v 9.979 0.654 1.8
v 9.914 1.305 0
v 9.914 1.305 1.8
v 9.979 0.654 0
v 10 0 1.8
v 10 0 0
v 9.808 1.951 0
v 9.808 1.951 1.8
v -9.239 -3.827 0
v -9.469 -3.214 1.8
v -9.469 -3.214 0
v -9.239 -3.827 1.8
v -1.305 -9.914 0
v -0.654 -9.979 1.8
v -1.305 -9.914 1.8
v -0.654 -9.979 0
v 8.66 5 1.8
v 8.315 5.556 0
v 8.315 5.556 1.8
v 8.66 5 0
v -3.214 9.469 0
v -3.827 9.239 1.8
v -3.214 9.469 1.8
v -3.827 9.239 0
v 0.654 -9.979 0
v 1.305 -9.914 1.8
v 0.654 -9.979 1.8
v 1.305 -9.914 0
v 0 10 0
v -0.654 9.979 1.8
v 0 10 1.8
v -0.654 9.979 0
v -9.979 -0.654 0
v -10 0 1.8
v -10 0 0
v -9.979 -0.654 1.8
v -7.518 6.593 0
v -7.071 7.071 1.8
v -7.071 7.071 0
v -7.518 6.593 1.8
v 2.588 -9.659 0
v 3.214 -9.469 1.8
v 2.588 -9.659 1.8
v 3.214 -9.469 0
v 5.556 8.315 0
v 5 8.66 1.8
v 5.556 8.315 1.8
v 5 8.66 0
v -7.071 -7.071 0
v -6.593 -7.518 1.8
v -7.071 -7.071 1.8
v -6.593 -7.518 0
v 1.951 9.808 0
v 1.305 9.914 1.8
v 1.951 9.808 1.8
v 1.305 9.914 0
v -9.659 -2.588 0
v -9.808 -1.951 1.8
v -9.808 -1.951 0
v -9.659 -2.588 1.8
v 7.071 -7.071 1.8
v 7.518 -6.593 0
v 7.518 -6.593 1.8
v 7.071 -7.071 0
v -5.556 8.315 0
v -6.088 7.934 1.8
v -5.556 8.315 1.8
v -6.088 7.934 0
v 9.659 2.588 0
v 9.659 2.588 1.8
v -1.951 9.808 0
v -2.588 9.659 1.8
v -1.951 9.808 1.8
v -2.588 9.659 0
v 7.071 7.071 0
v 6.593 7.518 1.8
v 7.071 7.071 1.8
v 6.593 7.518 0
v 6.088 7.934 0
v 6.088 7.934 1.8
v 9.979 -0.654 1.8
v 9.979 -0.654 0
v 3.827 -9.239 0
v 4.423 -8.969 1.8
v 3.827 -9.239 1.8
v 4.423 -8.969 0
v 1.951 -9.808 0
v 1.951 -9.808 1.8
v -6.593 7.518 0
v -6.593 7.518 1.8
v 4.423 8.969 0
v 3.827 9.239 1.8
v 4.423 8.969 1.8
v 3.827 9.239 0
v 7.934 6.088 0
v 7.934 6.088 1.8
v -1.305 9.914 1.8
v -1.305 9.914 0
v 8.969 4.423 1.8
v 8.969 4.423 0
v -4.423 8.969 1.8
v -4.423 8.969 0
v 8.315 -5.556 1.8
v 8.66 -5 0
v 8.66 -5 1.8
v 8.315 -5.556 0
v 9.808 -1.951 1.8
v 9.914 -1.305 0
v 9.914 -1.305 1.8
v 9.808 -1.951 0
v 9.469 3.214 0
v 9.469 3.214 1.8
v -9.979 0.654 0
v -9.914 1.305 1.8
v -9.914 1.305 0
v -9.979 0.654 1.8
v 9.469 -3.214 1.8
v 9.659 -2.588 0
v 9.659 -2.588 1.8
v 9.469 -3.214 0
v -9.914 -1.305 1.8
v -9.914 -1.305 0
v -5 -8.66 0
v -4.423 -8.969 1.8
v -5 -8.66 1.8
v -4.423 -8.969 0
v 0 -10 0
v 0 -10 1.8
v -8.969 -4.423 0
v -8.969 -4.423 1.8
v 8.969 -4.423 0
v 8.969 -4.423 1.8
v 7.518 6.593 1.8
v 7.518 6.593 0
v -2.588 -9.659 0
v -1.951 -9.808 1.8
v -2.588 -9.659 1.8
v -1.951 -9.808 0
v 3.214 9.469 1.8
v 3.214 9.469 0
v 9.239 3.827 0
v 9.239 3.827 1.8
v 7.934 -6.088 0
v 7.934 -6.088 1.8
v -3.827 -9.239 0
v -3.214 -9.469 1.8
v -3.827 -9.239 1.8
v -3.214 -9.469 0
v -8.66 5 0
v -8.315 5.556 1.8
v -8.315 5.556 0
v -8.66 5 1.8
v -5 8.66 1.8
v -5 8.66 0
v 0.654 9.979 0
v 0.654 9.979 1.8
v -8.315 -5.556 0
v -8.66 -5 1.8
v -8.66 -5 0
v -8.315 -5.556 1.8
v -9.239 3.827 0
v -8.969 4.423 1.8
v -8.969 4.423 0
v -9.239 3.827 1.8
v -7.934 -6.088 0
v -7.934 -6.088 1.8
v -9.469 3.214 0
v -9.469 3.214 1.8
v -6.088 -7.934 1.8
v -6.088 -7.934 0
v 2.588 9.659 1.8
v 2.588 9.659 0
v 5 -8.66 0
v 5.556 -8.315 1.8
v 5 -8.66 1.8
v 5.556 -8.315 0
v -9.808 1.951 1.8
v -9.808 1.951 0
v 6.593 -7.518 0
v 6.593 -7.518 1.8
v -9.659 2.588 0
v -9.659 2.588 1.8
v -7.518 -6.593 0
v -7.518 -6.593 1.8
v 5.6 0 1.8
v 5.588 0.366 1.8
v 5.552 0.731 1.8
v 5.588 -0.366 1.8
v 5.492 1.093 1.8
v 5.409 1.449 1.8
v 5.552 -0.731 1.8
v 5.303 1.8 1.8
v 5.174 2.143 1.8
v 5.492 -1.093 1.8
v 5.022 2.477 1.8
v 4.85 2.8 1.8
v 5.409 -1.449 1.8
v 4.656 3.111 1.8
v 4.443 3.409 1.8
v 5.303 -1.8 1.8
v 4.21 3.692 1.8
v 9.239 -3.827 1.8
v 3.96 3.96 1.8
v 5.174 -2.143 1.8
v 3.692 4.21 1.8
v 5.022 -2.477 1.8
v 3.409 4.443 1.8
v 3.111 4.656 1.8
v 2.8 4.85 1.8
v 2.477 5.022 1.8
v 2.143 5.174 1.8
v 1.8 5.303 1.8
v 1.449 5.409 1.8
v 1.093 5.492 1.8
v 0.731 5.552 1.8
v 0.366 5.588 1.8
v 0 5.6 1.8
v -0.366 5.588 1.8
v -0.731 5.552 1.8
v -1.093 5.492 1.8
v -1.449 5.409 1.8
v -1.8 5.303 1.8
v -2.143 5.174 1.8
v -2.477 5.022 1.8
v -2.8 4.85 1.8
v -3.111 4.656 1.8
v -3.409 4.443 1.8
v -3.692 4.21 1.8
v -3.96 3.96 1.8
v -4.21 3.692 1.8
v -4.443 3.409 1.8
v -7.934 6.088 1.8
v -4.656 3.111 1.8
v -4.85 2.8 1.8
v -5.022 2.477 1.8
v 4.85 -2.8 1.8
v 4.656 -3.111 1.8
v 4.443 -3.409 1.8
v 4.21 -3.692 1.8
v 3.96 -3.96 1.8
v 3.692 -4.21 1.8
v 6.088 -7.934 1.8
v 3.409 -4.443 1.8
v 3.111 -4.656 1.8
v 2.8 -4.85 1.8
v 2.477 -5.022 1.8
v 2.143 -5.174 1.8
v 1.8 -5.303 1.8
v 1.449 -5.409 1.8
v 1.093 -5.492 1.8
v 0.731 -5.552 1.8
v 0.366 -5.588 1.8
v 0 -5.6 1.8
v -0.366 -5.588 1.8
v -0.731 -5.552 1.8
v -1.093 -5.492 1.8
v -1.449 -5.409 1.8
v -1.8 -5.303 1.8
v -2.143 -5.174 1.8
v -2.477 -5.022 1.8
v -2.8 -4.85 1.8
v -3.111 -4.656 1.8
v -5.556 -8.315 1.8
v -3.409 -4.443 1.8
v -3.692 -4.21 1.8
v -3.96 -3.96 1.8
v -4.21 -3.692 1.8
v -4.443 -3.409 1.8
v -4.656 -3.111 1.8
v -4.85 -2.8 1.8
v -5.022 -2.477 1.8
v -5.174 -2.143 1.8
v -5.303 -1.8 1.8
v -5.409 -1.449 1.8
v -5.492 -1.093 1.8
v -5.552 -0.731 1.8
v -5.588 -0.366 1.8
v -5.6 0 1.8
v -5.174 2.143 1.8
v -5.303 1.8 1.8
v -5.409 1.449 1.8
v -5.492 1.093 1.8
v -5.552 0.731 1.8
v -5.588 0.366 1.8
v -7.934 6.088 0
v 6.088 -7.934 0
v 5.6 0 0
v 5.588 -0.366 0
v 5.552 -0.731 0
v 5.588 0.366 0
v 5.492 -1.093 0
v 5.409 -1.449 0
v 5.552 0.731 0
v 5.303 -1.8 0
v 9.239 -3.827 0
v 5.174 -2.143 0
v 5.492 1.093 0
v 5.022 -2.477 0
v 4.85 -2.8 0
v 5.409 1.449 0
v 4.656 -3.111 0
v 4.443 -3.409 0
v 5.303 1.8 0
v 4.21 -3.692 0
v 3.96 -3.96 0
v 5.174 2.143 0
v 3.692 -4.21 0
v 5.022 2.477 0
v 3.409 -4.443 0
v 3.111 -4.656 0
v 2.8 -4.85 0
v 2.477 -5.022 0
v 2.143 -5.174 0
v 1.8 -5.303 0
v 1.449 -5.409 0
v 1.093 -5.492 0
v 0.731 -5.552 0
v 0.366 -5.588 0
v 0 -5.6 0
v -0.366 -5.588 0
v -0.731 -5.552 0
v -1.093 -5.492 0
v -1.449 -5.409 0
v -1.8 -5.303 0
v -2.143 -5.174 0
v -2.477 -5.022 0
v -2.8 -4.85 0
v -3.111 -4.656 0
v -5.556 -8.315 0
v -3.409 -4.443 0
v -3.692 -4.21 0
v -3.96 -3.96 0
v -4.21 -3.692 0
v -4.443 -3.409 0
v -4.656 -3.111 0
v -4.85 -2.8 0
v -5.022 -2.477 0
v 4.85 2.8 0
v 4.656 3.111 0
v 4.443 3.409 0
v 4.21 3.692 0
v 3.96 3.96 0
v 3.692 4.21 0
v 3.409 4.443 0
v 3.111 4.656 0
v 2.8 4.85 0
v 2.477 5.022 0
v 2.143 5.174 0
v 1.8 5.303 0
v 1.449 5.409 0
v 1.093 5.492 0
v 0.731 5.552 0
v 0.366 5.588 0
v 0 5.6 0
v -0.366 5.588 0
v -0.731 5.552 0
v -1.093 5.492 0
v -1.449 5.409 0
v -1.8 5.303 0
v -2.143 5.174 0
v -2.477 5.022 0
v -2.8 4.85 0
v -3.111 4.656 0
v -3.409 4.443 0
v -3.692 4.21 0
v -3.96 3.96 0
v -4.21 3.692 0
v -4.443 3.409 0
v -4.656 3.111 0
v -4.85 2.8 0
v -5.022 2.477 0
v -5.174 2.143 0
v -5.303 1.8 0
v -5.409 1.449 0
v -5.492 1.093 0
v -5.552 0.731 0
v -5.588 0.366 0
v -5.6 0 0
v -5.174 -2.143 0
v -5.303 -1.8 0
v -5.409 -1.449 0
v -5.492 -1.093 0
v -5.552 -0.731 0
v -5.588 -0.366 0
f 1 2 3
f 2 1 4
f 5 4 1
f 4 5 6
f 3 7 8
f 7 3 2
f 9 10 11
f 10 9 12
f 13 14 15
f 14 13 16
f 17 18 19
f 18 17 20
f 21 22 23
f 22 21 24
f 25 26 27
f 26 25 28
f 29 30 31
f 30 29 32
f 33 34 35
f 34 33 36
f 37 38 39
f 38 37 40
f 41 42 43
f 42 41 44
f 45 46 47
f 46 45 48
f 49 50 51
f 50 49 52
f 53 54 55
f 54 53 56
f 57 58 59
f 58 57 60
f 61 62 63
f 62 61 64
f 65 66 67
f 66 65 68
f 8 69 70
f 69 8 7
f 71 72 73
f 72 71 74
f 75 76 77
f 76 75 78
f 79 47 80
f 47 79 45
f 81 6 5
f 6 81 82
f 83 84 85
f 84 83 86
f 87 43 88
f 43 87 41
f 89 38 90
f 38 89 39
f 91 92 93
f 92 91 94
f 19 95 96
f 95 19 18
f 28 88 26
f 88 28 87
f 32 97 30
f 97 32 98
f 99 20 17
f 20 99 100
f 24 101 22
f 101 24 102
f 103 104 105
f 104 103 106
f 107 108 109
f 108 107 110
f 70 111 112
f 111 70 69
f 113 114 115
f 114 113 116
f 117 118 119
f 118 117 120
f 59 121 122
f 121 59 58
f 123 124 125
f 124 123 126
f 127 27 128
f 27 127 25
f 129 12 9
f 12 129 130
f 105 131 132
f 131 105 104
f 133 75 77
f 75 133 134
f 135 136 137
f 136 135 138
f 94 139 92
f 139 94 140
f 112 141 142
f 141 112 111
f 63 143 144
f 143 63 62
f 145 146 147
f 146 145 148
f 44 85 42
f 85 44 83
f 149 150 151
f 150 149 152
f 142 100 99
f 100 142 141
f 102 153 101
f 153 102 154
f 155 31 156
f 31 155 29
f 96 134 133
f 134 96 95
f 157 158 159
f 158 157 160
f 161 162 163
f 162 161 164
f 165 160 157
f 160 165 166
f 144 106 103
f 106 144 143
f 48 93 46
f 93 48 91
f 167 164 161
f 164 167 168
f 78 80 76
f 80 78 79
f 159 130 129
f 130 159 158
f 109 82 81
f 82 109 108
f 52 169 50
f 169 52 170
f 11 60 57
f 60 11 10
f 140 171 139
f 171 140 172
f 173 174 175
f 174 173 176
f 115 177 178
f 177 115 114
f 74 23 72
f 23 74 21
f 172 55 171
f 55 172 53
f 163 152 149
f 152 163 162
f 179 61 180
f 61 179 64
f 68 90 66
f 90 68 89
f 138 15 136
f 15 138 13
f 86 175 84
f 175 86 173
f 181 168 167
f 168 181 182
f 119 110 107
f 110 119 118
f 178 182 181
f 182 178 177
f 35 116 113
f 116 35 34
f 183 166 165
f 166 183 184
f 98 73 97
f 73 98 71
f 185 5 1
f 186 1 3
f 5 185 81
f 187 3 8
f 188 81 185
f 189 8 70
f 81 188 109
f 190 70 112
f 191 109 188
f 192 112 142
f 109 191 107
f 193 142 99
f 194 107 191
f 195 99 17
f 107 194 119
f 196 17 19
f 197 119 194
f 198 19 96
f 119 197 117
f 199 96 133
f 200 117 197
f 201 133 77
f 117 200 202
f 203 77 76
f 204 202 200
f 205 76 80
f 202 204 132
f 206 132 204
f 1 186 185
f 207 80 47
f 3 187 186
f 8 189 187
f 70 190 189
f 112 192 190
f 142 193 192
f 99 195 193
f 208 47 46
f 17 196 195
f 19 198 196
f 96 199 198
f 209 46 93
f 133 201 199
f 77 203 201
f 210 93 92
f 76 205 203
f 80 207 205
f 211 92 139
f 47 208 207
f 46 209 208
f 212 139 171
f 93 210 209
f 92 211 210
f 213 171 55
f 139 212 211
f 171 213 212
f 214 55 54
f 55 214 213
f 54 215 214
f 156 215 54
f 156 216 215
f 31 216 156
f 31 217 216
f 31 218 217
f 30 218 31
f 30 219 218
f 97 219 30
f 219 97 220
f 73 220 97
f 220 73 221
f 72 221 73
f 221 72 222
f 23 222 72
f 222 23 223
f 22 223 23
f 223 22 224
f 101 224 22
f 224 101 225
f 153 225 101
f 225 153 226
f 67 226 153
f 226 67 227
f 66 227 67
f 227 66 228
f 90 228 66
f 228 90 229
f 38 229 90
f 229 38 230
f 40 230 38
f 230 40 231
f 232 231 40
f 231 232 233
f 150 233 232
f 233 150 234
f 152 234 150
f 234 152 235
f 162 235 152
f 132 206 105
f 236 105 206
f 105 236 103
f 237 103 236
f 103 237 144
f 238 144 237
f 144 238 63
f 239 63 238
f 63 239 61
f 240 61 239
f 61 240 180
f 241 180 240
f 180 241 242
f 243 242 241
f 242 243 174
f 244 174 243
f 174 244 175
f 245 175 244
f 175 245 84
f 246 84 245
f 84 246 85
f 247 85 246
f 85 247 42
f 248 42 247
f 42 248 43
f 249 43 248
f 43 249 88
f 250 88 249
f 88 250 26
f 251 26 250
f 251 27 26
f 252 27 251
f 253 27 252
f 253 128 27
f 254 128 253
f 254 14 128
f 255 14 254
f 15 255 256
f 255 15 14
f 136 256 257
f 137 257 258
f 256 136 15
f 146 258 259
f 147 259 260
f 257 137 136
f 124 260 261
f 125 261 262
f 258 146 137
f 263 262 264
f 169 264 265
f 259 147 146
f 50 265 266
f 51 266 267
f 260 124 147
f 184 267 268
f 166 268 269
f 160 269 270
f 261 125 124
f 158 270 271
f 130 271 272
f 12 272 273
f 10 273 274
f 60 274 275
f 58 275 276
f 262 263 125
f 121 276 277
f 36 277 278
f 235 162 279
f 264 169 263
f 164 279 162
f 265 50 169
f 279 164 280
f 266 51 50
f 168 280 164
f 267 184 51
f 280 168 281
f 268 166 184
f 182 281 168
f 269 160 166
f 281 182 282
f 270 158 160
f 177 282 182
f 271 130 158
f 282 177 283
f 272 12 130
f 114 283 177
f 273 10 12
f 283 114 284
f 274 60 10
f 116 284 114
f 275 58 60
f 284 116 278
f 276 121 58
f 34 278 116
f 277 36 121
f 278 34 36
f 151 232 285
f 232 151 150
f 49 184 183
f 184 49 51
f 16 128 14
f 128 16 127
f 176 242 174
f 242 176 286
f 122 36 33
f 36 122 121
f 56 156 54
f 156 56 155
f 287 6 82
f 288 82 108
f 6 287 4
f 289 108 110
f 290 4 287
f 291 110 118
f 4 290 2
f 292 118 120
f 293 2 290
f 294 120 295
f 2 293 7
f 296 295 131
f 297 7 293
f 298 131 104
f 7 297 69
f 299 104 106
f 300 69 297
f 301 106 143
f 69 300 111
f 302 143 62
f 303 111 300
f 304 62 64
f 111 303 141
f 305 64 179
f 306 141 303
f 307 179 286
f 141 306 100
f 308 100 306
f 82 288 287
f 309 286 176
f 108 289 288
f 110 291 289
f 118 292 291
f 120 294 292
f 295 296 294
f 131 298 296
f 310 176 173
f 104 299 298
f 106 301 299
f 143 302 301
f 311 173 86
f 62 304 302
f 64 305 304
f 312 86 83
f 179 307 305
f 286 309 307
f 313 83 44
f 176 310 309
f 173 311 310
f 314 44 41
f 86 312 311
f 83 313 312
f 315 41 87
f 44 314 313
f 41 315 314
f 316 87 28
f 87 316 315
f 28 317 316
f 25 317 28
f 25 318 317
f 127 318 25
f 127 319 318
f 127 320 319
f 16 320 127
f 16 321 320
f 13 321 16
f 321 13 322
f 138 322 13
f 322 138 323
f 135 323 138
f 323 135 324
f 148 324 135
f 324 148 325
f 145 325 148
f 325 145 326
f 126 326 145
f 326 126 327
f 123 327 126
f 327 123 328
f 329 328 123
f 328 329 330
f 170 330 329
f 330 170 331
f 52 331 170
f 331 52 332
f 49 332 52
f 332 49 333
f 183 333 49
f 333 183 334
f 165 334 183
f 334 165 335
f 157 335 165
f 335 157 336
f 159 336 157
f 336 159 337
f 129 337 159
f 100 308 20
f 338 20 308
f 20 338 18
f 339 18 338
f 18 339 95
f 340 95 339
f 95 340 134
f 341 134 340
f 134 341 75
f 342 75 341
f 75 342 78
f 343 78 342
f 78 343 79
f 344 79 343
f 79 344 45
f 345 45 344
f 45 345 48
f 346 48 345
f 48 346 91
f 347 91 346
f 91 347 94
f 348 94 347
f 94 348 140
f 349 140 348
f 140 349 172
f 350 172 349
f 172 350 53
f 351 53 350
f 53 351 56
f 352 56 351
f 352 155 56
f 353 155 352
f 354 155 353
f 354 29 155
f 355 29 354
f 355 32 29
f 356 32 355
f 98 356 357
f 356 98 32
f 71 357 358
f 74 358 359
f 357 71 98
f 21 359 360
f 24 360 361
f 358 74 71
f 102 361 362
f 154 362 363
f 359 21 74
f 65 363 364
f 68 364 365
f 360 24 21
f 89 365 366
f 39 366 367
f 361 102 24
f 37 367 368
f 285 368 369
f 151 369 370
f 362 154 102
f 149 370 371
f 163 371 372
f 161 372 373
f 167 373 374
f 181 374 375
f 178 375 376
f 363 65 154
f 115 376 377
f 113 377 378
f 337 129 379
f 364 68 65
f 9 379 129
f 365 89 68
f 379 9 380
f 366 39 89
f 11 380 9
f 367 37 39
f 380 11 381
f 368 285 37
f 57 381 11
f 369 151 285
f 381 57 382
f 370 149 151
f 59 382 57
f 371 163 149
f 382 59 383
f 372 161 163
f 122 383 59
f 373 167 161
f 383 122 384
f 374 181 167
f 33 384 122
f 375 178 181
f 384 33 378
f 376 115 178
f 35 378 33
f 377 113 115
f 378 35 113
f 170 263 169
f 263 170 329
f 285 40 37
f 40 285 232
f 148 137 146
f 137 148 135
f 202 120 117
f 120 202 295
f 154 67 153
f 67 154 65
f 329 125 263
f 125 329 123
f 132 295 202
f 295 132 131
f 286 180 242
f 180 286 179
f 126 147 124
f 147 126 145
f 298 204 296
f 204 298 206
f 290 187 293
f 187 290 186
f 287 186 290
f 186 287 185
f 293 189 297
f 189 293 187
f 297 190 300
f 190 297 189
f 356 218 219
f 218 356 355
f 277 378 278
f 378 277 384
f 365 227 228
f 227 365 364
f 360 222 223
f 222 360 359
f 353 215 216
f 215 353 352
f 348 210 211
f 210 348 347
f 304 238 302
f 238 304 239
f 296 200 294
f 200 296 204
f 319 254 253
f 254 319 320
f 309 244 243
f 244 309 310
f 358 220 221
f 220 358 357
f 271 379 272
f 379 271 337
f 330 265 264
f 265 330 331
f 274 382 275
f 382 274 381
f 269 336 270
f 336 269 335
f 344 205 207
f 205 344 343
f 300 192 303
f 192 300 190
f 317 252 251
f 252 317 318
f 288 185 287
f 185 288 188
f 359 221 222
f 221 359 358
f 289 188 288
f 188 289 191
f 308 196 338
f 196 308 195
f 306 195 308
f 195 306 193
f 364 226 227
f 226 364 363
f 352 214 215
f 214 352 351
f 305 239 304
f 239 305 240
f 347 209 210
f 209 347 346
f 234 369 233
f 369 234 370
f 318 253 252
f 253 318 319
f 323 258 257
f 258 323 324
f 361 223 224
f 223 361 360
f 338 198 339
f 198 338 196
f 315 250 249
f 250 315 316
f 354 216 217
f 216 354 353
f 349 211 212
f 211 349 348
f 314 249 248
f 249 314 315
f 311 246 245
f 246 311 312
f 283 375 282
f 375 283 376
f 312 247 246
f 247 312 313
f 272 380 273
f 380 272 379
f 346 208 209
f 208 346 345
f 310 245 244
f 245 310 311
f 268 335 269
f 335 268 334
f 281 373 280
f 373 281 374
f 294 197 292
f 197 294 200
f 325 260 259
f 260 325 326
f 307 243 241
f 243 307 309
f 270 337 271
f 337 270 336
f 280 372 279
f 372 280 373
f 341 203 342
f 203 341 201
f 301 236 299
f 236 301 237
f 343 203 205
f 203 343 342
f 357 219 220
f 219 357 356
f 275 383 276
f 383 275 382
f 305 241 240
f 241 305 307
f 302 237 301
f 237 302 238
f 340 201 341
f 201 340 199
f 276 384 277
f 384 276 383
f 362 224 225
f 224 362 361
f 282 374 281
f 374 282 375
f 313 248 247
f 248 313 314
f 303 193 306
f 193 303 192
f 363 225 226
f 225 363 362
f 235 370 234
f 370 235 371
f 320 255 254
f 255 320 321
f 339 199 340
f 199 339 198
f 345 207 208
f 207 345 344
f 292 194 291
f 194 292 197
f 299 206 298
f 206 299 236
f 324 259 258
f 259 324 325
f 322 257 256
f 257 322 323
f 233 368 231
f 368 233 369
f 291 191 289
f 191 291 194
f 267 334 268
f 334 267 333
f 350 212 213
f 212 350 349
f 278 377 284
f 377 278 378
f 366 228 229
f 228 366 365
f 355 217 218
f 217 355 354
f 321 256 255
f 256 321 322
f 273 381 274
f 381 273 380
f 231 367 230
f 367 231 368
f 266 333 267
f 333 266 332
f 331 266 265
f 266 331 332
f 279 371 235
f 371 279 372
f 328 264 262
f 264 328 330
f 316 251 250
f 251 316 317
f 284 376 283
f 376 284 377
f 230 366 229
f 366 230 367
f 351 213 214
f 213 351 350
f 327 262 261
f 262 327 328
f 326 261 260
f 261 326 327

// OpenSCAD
// Decorative lens flange: 20 mm ring around the camera lens, 11.2 mm hole (clears the lugs on the lens), 1.8 mm thick.
// Plain ring, no notches. Print flat, blue or white; fix with thin double-sided tape.
$fn = 96;
fl_od = 20; fl_id = 11.2; fl_t = 1.8;
difference() {
    cylinder(d = fl_od, h = fl_t);
    translate([0, 0, -1]) cylinder(d = fl_id, h = fl_t + 2);
}
